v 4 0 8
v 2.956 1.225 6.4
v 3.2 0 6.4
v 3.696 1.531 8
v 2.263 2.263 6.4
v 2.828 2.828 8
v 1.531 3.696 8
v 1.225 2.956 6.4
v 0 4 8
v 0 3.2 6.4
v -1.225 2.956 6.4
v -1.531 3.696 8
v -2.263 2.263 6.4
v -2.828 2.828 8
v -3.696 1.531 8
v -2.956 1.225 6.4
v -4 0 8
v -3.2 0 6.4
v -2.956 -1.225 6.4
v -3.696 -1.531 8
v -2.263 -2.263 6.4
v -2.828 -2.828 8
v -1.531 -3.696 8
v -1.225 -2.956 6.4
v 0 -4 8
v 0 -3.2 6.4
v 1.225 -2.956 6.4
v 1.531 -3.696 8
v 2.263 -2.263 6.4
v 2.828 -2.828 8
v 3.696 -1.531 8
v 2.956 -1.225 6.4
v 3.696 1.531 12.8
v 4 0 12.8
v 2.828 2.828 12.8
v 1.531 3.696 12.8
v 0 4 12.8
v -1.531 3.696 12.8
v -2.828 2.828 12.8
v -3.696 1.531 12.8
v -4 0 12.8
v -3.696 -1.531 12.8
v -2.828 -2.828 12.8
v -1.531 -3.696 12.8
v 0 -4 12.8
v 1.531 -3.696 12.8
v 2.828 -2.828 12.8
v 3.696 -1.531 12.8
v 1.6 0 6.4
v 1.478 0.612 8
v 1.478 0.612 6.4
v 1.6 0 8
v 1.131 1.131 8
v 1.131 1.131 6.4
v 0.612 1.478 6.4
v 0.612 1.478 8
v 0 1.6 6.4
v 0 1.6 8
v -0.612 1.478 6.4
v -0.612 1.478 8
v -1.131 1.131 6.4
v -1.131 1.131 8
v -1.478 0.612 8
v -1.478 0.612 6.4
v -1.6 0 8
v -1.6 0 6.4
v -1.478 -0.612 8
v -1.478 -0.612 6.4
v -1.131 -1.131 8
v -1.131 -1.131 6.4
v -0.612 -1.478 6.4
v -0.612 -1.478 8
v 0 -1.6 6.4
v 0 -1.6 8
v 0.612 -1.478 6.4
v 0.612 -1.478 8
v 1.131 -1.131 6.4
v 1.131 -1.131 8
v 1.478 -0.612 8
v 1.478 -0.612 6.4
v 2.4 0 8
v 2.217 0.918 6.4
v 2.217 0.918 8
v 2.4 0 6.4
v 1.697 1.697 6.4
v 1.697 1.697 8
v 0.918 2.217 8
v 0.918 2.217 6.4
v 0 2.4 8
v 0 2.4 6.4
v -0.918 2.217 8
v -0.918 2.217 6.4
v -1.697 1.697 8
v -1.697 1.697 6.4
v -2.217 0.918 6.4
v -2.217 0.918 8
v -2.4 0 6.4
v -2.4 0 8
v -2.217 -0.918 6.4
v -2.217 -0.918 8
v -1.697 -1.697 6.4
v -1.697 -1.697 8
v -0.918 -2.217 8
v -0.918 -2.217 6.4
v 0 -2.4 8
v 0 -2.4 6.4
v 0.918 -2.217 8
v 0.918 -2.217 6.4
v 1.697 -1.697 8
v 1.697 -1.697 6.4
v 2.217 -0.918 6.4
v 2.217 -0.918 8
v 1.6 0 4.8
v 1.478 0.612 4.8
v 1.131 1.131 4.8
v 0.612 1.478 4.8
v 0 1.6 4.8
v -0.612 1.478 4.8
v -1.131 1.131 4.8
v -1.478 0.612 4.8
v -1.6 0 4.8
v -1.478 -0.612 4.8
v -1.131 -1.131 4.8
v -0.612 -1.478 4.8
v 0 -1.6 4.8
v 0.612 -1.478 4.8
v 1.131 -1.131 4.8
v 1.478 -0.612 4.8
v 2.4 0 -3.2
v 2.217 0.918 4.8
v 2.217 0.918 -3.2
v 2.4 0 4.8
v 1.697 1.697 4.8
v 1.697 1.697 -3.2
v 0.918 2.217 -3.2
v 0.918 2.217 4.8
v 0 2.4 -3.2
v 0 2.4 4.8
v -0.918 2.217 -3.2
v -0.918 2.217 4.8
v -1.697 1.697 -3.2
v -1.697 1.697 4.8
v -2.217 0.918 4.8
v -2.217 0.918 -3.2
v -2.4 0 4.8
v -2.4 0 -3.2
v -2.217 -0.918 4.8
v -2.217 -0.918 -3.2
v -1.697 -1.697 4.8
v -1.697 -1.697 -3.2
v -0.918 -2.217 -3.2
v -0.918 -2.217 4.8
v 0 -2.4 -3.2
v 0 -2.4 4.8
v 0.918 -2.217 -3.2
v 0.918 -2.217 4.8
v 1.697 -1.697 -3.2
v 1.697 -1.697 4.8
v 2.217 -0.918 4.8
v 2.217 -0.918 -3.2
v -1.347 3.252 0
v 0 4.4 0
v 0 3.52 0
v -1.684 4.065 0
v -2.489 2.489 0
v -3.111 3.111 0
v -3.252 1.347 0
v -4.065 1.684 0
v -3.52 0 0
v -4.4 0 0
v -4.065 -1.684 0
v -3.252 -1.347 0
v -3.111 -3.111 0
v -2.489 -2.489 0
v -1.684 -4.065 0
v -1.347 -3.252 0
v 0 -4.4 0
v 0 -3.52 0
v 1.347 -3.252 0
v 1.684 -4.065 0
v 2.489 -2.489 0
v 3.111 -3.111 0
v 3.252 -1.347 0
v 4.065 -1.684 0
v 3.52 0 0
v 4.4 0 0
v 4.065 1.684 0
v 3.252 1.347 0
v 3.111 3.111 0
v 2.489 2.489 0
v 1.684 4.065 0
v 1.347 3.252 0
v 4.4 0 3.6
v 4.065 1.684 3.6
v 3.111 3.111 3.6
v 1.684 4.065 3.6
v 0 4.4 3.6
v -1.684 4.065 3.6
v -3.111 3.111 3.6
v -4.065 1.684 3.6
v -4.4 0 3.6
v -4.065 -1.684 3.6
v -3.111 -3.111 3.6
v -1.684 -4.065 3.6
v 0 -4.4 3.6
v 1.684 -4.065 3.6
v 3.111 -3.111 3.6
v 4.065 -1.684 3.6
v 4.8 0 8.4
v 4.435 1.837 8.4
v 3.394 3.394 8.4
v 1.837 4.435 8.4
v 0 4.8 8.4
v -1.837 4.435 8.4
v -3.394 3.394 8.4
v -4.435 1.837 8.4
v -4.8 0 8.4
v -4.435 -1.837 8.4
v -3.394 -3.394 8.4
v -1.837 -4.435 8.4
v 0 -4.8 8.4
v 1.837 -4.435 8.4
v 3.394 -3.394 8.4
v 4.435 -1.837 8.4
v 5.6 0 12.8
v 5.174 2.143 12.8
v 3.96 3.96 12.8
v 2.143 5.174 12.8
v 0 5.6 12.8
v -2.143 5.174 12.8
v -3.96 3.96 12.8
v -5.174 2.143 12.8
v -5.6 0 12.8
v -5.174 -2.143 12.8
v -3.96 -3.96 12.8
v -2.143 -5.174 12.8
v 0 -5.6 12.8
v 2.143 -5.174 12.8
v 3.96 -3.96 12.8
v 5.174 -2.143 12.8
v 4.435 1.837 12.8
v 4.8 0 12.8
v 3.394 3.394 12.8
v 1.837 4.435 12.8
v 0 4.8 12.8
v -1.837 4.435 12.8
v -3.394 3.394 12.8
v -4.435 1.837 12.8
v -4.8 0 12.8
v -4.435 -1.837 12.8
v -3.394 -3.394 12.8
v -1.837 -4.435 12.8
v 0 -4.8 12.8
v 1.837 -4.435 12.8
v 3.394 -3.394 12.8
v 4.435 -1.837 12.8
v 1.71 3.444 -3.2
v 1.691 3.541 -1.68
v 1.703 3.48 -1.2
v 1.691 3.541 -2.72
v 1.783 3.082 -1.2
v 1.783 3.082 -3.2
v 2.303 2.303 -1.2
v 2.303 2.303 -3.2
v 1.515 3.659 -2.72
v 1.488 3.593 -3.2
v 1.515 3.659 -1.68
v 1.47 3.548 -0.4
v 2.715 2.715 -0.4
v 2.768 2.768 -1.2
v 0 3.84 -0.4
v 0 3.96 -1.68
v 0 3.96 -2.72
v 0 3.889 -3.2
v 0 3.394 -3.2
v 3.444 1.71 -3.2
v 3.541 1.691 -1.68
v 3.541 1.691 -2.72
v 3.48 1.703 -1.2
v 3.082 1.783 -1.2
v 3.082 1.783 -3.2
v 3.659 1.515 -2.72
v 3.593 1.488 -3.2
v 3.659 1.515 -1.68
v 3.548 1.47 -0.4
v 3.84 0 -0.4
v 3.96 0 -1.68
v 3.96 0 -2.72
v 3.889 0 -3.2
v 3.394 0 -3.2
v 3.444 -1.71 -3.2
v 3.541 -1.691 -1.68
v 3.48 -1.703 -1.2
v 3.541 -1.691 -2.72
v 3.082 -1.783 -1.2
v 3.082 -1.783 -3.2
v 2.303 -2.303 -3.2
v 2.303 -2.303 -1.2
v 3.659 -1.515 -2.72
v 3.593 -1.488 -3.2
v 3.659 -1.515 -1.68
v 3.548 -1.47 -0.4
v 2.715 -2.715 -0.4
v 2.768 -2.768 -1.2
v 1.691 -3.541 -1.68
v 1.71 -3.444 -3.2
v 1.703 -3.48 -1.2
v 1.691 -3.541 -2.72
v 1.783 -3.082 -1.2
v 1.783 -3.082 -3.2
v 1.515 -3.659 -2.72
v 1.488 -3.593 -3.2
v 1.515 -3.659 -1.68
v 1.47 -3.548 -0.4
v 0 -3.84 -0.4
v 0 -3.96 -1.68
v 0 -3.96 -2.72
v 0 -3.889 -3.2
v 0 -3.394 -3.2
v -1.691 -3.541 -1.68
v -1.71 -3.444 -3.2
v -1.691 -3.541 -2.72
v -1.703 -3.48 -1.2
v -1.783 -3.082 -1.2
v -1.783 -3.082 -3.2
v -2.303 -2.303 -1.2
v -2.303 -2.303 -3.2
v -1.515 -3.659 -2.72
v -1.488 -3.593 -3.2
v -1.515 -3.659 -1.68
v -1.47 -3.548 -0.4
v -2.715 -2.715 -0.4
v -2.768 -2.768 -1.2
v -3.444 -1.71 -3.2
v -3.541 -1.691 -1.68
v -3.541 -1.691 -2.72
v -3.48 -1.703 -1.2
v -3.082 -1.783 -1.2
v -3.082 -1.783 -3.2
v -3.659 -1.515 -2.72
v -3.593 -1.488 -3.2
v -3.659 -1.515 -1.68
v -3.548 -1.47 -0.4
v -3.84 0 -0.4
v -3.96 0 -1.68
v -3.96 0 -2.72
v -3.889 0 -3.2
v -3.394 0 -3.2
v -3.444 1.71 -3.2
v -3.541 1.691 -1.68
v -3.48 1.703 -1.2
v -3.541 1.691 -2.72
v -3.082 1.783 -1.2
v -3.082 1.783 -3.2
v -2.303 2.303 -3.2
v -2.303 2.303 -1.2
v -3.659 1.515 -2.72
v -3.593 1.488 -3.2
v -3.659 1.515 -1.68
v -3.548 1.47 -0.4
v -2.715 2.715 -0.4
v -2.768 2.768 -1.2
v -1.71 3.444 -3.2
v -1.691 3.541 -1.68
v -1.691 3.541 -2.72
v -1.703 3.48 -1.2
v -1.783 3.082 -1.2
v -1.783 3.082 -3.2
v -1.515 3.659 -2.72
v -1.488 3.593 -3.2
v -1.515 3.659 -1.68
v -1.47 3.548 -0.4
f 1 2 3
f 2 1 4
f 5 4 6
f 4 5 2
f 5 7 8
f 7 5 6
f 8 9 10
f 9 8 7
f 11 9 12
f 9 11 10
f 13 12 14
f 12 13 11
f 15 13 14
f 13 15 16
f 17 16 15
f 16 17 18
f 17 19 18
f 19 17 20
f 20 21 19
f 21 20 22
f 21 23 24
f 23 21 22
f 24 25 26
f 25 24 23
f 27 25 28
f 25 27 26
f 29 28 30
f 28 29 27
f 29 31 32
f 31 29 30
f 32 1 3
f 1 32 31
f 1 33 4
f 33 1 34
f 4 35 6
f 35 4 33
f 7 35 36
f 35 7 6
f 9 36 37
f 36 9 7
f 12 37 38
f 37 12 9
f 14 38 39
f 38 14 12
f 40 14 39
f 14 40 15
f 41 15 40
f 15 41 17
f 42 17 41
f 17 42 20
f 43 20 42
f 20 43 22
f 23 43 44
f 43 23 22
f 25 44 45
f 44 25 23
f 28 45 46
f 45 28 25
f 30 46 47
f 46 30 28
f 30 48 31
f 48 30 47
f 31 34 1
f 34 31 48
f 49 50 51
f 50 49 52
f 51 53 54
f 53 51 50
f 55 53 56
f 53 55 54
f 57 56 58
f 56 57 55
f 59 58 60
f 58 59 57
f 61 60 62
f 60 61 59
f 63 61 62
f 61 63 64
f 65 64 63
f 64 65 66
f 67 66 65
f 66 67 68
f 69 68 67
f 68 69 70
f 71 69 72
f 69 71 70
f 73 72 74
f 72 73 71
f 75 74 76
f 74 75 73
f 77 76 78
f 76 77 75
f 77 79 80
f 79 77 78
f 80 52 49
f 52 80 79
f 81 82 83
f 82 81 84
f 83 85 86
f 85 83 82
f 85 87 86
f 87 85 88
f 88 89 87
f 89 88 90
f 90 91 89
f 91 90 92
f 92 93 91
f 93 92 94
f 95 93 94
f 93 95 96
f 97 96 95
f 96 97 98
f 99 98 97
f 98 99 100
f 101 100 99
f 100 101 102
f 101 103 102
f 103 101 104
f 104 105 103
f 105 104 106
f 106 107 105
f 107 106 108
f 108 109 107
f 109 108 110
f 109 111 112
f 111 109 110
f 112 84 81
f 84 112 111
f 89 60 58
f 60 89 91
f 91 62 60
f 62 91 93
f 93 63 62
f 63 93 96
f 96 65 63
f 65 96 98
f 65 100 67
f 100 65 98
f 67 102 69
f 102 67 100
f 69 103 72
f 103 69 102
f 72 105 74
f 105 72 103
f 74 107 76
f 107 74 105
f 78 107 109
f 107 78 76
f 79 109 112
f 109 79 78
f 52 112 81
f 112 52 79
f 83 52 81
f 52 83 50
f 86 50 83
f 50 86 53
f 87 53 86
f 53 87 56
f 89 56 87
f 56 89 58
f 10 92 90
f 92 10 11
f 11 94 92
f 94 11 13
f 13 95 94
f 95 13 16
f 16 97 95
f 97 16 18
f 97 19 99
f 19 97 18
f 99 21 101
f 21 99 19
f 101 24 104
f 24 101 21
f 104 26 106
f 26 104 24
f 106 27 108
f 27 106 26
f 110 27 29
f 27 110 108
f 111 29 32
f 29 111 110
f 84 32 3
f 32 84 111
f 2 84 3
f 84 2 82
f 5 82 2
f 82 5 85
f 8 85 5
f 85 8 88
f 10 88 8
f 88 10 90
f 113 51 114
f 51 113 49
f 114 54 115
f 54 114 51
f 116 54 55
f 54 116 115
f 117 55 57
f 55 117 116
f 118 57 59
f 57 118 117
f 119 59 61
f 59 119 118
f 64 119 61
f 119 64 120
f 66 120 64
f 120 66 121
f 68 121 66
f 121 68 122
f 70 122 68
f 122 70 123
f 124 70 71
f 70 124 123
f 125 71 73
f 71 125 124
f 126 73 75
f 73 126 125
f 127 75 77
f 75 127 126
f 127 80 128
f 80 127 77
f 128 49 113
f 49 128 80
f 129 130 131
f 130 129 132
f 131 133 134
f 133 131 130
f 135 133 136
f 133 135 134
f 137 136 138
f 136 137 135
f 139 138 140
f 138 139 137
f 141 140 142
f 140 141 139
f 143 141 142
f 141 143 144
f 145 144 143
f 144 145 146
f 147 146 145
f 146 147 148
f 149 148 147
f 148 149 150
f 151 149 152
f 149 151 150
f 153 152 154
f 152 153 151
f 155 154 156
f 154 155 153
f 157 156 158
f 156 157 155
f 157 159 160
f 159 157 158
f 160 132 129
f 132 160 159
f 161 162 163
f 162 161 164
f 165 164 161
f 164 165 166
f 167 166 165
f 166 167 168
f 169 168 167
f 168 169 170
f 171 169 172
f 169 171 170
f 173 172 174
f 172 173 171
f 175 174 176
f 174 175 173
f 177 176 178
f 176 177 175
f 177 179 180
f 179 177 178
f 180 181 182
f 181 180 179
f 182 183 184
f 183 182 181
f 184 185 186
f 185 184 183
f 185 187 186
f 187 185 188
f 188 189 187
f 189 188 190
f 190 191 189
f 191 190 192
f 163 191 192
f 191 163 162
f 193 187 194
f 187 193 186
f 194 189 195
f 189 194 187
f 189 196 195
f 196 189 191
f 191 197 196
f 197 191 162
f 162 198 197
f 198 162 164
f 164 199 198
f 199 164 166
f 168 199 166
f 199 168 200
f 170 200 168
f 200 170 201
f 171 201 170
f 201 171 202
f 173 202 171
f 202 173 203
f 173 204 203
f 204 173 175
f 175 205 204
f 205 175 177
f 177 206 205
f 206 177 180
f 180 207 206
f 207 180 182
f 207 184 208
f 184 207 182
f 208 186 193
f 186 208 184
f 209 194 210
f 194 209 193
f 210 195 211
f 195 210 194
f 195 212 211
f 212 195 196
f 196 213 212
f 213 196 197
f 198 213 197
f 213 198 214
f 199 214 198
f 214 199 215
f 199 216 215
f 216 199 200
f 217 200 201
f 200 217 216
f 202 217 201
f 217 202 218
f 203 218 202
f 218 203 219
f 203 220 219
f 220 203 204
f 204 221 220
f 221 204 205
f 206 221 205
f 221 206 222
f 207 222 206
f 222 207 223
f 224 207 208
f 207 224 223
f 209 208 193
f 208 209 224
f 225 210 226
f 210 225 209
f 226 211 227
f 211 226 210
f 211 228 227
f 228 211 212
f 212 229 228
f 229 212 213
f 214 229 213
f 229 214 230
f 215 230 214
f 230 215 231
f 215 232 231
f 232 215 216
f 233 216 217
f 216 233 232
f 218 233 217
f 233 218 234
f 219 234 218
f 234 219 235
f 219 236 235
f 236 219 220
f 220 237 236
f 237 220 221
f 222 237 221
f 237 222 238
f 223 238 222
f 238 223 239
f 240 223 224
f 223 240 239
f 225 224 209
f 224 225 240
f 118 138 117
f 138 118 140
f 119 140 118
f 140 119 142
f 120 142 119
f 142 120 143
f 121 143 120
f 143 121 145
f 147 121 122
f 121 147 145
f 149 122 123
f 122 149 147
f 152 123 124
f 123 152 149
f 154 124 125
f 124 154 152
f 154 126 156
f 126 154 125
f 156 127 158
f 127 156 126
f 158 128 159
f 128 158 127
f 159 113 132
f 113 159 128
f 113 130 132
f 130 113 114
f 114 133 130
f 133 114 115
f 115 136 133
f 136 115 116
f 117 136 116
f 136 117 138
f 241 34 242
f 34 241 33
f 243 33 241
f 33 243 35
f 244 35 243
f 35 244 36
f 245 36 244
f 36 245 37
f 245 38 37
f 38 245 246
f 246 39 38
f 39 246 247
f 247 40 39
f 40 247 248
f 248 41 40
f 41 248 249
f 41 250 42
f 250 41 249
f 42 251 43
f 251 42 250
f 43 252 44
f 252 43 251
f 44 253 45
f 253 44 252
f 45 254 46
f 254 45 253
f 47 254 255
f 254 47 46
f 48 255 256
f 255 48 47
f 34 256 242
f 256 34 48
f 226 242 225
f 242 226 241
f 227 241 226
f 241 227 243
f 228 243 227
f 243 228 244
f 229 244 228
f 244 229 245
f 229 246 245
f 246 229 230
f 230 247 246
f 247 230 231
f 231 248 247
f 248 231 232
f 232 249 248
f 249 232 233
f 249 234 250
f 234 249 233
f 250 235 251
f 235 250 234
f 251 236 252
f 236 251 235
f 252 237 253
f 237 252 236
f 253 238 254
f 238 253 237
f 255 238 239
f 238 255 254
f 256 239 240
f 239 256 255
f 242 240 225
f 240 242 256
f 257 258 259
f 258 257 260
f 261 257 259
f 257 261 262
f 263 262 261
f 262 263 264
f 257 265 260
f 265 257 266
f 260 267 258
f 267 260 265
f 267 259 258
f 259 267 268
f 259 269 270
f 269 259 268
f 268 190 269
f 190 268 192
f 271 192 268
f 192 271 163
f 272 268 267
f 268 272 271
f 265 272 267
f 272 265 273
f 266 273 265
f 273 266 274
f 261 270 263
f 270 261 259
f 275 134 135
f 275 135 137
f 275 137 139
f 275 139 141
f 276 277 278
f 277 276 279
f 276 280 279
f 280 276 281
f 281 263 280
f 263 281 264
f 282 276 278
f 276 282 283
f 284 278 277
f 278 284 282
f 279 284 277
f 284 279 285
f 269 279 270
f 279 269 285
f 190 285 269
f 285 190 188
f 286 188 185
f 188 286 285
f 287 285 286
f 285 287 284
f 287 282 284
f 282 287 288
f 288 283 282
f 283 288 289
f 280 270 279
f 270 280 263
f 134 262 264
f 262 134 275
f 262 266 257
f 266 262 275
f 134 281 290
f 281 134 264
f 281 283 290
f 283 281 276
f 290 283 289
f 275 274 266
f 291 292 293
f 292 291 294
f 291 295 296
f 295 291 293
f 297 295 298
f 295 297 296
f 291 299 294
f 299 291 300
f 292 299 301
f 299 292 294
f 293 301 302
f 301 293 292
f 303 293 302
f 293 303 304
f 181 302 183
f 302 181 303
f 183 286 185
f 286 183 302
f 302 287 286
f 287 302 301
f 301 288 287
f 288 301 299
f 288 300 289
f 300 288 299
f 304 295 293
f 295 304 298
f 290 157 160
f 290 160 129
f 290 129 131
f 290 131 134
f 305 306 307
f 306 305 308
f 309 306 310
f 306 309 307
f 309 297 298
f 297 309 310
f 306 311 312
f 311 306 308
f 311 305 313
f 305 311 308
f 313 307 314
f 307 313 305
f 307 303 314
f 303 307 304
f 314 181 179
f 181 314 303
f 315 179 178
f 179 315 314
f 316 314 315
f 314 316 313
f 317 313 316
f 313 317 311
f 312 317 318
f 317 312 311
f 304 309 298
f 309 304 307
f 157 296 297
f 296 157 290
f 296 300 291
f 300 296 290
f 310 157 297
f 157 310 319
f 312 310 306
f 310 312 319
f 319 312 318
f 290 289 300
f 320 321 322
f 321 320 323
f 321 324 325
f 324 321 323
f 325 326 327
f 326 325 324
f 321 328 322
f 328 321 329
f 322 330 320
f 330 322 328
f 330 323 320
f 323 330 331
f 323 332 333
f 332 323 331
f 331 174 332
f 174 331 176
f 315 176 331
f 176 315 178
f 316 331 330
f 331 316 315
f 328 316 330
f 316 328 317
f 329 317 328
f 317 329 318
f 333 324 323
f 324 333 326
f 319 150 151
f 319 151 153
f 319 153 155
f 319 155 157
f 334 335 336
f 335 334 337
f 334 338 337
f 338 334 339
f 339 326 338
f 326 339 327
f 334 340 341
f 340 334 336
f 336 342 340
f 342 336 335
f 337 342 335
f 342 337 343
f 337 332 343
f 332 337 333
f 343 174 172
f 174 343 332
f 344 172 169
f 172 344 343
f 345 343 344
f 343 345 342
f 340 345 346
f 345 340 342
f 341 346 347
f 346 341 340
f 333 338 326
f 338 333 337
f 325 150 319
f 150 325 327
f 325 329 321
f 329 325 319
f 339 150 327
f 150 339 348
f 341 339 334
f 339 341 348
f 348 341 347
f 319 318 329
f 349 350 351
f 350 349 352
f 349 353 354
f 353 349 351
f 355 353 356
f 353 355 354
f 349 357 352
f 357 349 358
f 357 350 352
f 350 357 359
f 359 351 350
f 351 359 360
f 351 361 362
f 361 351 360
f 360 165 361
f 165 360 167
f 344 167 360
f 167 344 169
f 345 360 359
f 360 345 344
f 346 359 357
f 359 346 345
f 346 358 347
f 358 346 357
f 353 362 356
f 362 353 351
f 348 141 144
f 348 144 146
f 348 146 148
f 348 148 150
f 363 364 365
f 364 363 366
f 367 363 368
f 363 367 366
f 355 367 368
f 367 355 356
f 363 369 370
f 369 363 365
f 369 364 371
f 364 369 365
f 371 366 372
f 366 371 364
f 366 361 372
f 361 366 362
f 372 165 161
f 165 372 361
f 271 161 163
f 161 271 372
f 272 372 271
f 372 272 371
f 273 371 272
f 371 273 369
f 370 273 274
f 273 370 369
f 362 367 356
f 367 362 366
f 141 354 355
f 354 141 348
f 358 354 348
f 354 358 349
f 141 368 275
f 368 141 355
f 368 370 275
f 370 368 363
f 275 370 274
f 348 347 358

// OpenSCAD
use <../lib.scad>
use <../p/4-4con11.scad>
use <../p/4-4con4.scad>
use <../p/4-4con6.scad>
use <../p/4-4cyli.scad>
use <../p/4-4cylo.scad>
use <../p/4-4edge.scad>
use <../p/4-4ring2.scad>
use <../p/4-4ring3.scad>
use <../p/4-4ring4.scad>
use <../p/4-4ring5.scad>
use <../p/4-4ring6.scad>
use <s/2536bs01.scad>
use <../p/stud2a.scad>
function ldraw_lib__2536b() = [
// 0 Plant Tree Palm Trunk with Short Indented Connector
// 0 Name: 2536b.dat
// 0 Author: Tore Eriksson [Tore_Eriksson]
// 0 !LDRAW_ORG Part UPDATE 2020-03
// 0 !LICENSE Licensed under CC BY 4.0 : see CAreadme.txt
// 
// 0 BFC CERTIFY CCW
  [0,"BFC","CERTIFY"],
  [0,"BFC","CCW"],
// 
// 0 !HISTORY 1998-07-15 [PTadmin] Official Update 1998-07
// 0 !HISTORY 1999-03-26 [PTadmin] Official Update 1999-02
// 0 !HISTORY 1999-05-24 [PTadmin] Official Update 1999-04
// 0 !HISTORY 2004-08-06 [guyvivan] Made BFC Compliant
// 0 !HISTORY 2004-11-06 [PTadmin] Official Update 2004-04
// 0 !HISTORY 2007-05-14 [PTadmin] Header formatted for Contributor Agreement
// 0 !HISTORY 2008-07-01 [PTadmin] Official Update 2008-01
// 0 !HISTORY 2011-12-30 [Philo] Added condlines to smooth cone, used stud2a
// 0 !HISTORY 2012-03-30 [PTadmin] Official Update 2012-01
// 0 !HISTORY 2019-12-15 [Philo] Renamed from 2536 and corrected wrong dimensions (stud height, bottom hole, etc)
// 0 !HISTORY 2020-12-29 [PTadmin] Official Update 2020-03
// 
// 
// 0 BFC INVERTNEXT
  [0,"BFC","INVERTNEXT"],
// 1 16 0 -20 0 2 0 0 0 4 0 0 0 2 4-4con4.dat
  [1,16,0,-20,0,2,0,0,0,4,0,0,0,2, ldraw_lib__4_4con4()],
// 0 BFC INVERTNEXT
  [0,"BFC","INVERTNEXT"],
// 1 16 0 -32 0 10 0 0 0 12 0 0 0 10 4-4cylo.dat
  [1,16,0,-32,0,10,0,0,0,12,0,0,0,10, ldraw_lib__4_4cylo()],
// 1 16 0 -16 0 1 0 0 0 1 0 0 0 1 stud2a.dat
  [1,16,0,-16,0,1,0,0,0,1,0,0,0,1, ldraw_lib__stud2a()],
// 1 16 0 -16 0 6 0 0 0 1 0 0 0 6 4-4edge.dat
  [1,16,0,-16,0,6,0,0,0,1,0,0,0,6, ldraw_lib__4_4edge()],
// 1 16 0 -16 0 8 0 0 0 1 0 0 0 8 4-4edge.dat
  [1,16,0,-16,0,8,0,0,0,1,0,0,0,8, ldraw_lib__4_4edge()],
// 1 16 0 -16 0 2 0 0 0 1 0 0 0 2 4-4ring3.dat
  [1,16,0,-16,0,2,0,0,0,1,0,0,0,2, ldraw_lib__4_4ring3()],
// 0 BFC INVERTNEXT
  [0,"BFC","INVERTNEXT"],
// 1 16 0 -12 0 4 0 0 0 -4 0 0 0 4 4-4cyli.dat
  [1,16,0,-12,0,4,0,0,0,-4,0,0,0,4, ldraw_lib__4_4cyli()],
// 0 BFC INVERTNEXT
  [0,"BFC","INVERTNEXT"],
// 1 16 0 -12 0 6 0 0 0 20 0 0 0 6 4-4cylo.dat
  [1,16,0,-12,0,6,0,0,0,20,0,0,0,6, ldraw_lib__4_4cylo()],
// 1 16 0 0 0 11 0 0 0 1 0 0 0 11 4-4edge.dat
  [1,16,0,0,0,11,0,0,0,1,0,0,0,11, ldraw_lib__4_4edge()],
// 1 16 0 0 0 2.2 0 0 0 -1 0 0 0 2.2 4-4ring4.dat
  [1,16,0,0,0,2.2,0,0,0,-1,0,0,0,2.2, ldraw_lib__4_4ring4()],
// 1 16 0 0 0 8.8 0 0 0 1 0 0 0 8.8 4-4edge.dat
  [1,16,0,0,0,8.8,0,0,0,1,0,0,0,8.8, ldraw_lib__4_4edge()],
// 1 16 0 -9 0 11 0 0 0 9 0 0 0 11 4-4cyli.dat
  [1,16,0,-9,0,11,0,0,0,9,0,0,0,11, ldraw_lib__4_4cyli()],
// 1 16 0 -21 0 1 0 0 0 12 0 0 0 1 4-4con11.dat
  [1,16,0,-21,0,1,0,0,0,12,0,0,0,1, ldraw_lib__4_4con11()],
// 1 16 0 -32 0 2 0 0 0 11 0 0 0 2 4-4con6.dat
  [1,16,0,-32,0,2,0,0,0,11,0,0,0,2, ldraw_lib__4_4con6()],
// 1 16 0 -12 0 4 0 0 0 1 0 0 0 4 4-4edge.dat
  [1,16,0,-12,0,4,0,0,0,1,0,0,0,4, ldraw_lib__4_4edge()],
// 1 16 0 -12 0 2 0 0 0 -1 0 0 0 2 4-4ring2.dat
  [1,16,0,-12,0,2,0,0,0,-1,0,0,0,2, ldraw_lib__4_4ring2()],
// 1 16 0 -32 0 14 0 0 0 1 0 0 0 14 4-4edge.dat
  [1,16,0,-32,0,14,0,0,0,1,0,0,0,14, ldraw_lib__4_4edge()],
// 1 16 0 -32 0 2 0 0 0 1 0 0 0 2 4-4ring5.dat
  [1,16,0,-32,0,2,0,0,0,1,0,0,0,2, ldraw_lib__4_4ring5()],
// 1 16 0 -32 0 2 0 0 0 1 0 0 0 2 4-4ring6.dat
  [1,16,0,-32,0,2,0,0,0,1,0,0,0,2, ldraw_lib__4_4ring6()],
// 1 16 0 0 0 1 0 0 0 1 0 0 0 1 s\2536bs01.dat
  [1,16,0,0,0,1,0,0,0,1,0,0,0,1, ldraw_lib__s__2536bs01()],
// 1 16 0 0 0 0 0 1 0 1 0 -1 0 0 s\2536bs01.dat
  [1,16,0,0,0,0,0,1,0,1,0,-1,0,0, ldraw_lib__s__2536bs01()],
// 1 16 0 0 0 -1 0 0 0 1 0 0 0 -1 s\2536bs01.dat
  [1,16,0,0,0,-1,0,0,0,1,0,0,0,-1, ldraw_lib__s__2536bs01()],
// 1 16 0 0 0 0 0 -1 0 1 0 1 0 0 s\2536bs01.dat
  [1,16,0,0,0,0,0,-1,0,1,0,1,0,0, ldraw_lib__s__2536bs01()],
];
module ldraw_lib__2536b(step=0, col=false, unit=2/5, alt=false, line=0.2, solid=!$preview)
    makepoly(ldraw_lib__2536b(), step=step, col=col, unit=unit, alt=alt, line=line, solid=solid);
ldraw_lib__2536b(line=0.2);
